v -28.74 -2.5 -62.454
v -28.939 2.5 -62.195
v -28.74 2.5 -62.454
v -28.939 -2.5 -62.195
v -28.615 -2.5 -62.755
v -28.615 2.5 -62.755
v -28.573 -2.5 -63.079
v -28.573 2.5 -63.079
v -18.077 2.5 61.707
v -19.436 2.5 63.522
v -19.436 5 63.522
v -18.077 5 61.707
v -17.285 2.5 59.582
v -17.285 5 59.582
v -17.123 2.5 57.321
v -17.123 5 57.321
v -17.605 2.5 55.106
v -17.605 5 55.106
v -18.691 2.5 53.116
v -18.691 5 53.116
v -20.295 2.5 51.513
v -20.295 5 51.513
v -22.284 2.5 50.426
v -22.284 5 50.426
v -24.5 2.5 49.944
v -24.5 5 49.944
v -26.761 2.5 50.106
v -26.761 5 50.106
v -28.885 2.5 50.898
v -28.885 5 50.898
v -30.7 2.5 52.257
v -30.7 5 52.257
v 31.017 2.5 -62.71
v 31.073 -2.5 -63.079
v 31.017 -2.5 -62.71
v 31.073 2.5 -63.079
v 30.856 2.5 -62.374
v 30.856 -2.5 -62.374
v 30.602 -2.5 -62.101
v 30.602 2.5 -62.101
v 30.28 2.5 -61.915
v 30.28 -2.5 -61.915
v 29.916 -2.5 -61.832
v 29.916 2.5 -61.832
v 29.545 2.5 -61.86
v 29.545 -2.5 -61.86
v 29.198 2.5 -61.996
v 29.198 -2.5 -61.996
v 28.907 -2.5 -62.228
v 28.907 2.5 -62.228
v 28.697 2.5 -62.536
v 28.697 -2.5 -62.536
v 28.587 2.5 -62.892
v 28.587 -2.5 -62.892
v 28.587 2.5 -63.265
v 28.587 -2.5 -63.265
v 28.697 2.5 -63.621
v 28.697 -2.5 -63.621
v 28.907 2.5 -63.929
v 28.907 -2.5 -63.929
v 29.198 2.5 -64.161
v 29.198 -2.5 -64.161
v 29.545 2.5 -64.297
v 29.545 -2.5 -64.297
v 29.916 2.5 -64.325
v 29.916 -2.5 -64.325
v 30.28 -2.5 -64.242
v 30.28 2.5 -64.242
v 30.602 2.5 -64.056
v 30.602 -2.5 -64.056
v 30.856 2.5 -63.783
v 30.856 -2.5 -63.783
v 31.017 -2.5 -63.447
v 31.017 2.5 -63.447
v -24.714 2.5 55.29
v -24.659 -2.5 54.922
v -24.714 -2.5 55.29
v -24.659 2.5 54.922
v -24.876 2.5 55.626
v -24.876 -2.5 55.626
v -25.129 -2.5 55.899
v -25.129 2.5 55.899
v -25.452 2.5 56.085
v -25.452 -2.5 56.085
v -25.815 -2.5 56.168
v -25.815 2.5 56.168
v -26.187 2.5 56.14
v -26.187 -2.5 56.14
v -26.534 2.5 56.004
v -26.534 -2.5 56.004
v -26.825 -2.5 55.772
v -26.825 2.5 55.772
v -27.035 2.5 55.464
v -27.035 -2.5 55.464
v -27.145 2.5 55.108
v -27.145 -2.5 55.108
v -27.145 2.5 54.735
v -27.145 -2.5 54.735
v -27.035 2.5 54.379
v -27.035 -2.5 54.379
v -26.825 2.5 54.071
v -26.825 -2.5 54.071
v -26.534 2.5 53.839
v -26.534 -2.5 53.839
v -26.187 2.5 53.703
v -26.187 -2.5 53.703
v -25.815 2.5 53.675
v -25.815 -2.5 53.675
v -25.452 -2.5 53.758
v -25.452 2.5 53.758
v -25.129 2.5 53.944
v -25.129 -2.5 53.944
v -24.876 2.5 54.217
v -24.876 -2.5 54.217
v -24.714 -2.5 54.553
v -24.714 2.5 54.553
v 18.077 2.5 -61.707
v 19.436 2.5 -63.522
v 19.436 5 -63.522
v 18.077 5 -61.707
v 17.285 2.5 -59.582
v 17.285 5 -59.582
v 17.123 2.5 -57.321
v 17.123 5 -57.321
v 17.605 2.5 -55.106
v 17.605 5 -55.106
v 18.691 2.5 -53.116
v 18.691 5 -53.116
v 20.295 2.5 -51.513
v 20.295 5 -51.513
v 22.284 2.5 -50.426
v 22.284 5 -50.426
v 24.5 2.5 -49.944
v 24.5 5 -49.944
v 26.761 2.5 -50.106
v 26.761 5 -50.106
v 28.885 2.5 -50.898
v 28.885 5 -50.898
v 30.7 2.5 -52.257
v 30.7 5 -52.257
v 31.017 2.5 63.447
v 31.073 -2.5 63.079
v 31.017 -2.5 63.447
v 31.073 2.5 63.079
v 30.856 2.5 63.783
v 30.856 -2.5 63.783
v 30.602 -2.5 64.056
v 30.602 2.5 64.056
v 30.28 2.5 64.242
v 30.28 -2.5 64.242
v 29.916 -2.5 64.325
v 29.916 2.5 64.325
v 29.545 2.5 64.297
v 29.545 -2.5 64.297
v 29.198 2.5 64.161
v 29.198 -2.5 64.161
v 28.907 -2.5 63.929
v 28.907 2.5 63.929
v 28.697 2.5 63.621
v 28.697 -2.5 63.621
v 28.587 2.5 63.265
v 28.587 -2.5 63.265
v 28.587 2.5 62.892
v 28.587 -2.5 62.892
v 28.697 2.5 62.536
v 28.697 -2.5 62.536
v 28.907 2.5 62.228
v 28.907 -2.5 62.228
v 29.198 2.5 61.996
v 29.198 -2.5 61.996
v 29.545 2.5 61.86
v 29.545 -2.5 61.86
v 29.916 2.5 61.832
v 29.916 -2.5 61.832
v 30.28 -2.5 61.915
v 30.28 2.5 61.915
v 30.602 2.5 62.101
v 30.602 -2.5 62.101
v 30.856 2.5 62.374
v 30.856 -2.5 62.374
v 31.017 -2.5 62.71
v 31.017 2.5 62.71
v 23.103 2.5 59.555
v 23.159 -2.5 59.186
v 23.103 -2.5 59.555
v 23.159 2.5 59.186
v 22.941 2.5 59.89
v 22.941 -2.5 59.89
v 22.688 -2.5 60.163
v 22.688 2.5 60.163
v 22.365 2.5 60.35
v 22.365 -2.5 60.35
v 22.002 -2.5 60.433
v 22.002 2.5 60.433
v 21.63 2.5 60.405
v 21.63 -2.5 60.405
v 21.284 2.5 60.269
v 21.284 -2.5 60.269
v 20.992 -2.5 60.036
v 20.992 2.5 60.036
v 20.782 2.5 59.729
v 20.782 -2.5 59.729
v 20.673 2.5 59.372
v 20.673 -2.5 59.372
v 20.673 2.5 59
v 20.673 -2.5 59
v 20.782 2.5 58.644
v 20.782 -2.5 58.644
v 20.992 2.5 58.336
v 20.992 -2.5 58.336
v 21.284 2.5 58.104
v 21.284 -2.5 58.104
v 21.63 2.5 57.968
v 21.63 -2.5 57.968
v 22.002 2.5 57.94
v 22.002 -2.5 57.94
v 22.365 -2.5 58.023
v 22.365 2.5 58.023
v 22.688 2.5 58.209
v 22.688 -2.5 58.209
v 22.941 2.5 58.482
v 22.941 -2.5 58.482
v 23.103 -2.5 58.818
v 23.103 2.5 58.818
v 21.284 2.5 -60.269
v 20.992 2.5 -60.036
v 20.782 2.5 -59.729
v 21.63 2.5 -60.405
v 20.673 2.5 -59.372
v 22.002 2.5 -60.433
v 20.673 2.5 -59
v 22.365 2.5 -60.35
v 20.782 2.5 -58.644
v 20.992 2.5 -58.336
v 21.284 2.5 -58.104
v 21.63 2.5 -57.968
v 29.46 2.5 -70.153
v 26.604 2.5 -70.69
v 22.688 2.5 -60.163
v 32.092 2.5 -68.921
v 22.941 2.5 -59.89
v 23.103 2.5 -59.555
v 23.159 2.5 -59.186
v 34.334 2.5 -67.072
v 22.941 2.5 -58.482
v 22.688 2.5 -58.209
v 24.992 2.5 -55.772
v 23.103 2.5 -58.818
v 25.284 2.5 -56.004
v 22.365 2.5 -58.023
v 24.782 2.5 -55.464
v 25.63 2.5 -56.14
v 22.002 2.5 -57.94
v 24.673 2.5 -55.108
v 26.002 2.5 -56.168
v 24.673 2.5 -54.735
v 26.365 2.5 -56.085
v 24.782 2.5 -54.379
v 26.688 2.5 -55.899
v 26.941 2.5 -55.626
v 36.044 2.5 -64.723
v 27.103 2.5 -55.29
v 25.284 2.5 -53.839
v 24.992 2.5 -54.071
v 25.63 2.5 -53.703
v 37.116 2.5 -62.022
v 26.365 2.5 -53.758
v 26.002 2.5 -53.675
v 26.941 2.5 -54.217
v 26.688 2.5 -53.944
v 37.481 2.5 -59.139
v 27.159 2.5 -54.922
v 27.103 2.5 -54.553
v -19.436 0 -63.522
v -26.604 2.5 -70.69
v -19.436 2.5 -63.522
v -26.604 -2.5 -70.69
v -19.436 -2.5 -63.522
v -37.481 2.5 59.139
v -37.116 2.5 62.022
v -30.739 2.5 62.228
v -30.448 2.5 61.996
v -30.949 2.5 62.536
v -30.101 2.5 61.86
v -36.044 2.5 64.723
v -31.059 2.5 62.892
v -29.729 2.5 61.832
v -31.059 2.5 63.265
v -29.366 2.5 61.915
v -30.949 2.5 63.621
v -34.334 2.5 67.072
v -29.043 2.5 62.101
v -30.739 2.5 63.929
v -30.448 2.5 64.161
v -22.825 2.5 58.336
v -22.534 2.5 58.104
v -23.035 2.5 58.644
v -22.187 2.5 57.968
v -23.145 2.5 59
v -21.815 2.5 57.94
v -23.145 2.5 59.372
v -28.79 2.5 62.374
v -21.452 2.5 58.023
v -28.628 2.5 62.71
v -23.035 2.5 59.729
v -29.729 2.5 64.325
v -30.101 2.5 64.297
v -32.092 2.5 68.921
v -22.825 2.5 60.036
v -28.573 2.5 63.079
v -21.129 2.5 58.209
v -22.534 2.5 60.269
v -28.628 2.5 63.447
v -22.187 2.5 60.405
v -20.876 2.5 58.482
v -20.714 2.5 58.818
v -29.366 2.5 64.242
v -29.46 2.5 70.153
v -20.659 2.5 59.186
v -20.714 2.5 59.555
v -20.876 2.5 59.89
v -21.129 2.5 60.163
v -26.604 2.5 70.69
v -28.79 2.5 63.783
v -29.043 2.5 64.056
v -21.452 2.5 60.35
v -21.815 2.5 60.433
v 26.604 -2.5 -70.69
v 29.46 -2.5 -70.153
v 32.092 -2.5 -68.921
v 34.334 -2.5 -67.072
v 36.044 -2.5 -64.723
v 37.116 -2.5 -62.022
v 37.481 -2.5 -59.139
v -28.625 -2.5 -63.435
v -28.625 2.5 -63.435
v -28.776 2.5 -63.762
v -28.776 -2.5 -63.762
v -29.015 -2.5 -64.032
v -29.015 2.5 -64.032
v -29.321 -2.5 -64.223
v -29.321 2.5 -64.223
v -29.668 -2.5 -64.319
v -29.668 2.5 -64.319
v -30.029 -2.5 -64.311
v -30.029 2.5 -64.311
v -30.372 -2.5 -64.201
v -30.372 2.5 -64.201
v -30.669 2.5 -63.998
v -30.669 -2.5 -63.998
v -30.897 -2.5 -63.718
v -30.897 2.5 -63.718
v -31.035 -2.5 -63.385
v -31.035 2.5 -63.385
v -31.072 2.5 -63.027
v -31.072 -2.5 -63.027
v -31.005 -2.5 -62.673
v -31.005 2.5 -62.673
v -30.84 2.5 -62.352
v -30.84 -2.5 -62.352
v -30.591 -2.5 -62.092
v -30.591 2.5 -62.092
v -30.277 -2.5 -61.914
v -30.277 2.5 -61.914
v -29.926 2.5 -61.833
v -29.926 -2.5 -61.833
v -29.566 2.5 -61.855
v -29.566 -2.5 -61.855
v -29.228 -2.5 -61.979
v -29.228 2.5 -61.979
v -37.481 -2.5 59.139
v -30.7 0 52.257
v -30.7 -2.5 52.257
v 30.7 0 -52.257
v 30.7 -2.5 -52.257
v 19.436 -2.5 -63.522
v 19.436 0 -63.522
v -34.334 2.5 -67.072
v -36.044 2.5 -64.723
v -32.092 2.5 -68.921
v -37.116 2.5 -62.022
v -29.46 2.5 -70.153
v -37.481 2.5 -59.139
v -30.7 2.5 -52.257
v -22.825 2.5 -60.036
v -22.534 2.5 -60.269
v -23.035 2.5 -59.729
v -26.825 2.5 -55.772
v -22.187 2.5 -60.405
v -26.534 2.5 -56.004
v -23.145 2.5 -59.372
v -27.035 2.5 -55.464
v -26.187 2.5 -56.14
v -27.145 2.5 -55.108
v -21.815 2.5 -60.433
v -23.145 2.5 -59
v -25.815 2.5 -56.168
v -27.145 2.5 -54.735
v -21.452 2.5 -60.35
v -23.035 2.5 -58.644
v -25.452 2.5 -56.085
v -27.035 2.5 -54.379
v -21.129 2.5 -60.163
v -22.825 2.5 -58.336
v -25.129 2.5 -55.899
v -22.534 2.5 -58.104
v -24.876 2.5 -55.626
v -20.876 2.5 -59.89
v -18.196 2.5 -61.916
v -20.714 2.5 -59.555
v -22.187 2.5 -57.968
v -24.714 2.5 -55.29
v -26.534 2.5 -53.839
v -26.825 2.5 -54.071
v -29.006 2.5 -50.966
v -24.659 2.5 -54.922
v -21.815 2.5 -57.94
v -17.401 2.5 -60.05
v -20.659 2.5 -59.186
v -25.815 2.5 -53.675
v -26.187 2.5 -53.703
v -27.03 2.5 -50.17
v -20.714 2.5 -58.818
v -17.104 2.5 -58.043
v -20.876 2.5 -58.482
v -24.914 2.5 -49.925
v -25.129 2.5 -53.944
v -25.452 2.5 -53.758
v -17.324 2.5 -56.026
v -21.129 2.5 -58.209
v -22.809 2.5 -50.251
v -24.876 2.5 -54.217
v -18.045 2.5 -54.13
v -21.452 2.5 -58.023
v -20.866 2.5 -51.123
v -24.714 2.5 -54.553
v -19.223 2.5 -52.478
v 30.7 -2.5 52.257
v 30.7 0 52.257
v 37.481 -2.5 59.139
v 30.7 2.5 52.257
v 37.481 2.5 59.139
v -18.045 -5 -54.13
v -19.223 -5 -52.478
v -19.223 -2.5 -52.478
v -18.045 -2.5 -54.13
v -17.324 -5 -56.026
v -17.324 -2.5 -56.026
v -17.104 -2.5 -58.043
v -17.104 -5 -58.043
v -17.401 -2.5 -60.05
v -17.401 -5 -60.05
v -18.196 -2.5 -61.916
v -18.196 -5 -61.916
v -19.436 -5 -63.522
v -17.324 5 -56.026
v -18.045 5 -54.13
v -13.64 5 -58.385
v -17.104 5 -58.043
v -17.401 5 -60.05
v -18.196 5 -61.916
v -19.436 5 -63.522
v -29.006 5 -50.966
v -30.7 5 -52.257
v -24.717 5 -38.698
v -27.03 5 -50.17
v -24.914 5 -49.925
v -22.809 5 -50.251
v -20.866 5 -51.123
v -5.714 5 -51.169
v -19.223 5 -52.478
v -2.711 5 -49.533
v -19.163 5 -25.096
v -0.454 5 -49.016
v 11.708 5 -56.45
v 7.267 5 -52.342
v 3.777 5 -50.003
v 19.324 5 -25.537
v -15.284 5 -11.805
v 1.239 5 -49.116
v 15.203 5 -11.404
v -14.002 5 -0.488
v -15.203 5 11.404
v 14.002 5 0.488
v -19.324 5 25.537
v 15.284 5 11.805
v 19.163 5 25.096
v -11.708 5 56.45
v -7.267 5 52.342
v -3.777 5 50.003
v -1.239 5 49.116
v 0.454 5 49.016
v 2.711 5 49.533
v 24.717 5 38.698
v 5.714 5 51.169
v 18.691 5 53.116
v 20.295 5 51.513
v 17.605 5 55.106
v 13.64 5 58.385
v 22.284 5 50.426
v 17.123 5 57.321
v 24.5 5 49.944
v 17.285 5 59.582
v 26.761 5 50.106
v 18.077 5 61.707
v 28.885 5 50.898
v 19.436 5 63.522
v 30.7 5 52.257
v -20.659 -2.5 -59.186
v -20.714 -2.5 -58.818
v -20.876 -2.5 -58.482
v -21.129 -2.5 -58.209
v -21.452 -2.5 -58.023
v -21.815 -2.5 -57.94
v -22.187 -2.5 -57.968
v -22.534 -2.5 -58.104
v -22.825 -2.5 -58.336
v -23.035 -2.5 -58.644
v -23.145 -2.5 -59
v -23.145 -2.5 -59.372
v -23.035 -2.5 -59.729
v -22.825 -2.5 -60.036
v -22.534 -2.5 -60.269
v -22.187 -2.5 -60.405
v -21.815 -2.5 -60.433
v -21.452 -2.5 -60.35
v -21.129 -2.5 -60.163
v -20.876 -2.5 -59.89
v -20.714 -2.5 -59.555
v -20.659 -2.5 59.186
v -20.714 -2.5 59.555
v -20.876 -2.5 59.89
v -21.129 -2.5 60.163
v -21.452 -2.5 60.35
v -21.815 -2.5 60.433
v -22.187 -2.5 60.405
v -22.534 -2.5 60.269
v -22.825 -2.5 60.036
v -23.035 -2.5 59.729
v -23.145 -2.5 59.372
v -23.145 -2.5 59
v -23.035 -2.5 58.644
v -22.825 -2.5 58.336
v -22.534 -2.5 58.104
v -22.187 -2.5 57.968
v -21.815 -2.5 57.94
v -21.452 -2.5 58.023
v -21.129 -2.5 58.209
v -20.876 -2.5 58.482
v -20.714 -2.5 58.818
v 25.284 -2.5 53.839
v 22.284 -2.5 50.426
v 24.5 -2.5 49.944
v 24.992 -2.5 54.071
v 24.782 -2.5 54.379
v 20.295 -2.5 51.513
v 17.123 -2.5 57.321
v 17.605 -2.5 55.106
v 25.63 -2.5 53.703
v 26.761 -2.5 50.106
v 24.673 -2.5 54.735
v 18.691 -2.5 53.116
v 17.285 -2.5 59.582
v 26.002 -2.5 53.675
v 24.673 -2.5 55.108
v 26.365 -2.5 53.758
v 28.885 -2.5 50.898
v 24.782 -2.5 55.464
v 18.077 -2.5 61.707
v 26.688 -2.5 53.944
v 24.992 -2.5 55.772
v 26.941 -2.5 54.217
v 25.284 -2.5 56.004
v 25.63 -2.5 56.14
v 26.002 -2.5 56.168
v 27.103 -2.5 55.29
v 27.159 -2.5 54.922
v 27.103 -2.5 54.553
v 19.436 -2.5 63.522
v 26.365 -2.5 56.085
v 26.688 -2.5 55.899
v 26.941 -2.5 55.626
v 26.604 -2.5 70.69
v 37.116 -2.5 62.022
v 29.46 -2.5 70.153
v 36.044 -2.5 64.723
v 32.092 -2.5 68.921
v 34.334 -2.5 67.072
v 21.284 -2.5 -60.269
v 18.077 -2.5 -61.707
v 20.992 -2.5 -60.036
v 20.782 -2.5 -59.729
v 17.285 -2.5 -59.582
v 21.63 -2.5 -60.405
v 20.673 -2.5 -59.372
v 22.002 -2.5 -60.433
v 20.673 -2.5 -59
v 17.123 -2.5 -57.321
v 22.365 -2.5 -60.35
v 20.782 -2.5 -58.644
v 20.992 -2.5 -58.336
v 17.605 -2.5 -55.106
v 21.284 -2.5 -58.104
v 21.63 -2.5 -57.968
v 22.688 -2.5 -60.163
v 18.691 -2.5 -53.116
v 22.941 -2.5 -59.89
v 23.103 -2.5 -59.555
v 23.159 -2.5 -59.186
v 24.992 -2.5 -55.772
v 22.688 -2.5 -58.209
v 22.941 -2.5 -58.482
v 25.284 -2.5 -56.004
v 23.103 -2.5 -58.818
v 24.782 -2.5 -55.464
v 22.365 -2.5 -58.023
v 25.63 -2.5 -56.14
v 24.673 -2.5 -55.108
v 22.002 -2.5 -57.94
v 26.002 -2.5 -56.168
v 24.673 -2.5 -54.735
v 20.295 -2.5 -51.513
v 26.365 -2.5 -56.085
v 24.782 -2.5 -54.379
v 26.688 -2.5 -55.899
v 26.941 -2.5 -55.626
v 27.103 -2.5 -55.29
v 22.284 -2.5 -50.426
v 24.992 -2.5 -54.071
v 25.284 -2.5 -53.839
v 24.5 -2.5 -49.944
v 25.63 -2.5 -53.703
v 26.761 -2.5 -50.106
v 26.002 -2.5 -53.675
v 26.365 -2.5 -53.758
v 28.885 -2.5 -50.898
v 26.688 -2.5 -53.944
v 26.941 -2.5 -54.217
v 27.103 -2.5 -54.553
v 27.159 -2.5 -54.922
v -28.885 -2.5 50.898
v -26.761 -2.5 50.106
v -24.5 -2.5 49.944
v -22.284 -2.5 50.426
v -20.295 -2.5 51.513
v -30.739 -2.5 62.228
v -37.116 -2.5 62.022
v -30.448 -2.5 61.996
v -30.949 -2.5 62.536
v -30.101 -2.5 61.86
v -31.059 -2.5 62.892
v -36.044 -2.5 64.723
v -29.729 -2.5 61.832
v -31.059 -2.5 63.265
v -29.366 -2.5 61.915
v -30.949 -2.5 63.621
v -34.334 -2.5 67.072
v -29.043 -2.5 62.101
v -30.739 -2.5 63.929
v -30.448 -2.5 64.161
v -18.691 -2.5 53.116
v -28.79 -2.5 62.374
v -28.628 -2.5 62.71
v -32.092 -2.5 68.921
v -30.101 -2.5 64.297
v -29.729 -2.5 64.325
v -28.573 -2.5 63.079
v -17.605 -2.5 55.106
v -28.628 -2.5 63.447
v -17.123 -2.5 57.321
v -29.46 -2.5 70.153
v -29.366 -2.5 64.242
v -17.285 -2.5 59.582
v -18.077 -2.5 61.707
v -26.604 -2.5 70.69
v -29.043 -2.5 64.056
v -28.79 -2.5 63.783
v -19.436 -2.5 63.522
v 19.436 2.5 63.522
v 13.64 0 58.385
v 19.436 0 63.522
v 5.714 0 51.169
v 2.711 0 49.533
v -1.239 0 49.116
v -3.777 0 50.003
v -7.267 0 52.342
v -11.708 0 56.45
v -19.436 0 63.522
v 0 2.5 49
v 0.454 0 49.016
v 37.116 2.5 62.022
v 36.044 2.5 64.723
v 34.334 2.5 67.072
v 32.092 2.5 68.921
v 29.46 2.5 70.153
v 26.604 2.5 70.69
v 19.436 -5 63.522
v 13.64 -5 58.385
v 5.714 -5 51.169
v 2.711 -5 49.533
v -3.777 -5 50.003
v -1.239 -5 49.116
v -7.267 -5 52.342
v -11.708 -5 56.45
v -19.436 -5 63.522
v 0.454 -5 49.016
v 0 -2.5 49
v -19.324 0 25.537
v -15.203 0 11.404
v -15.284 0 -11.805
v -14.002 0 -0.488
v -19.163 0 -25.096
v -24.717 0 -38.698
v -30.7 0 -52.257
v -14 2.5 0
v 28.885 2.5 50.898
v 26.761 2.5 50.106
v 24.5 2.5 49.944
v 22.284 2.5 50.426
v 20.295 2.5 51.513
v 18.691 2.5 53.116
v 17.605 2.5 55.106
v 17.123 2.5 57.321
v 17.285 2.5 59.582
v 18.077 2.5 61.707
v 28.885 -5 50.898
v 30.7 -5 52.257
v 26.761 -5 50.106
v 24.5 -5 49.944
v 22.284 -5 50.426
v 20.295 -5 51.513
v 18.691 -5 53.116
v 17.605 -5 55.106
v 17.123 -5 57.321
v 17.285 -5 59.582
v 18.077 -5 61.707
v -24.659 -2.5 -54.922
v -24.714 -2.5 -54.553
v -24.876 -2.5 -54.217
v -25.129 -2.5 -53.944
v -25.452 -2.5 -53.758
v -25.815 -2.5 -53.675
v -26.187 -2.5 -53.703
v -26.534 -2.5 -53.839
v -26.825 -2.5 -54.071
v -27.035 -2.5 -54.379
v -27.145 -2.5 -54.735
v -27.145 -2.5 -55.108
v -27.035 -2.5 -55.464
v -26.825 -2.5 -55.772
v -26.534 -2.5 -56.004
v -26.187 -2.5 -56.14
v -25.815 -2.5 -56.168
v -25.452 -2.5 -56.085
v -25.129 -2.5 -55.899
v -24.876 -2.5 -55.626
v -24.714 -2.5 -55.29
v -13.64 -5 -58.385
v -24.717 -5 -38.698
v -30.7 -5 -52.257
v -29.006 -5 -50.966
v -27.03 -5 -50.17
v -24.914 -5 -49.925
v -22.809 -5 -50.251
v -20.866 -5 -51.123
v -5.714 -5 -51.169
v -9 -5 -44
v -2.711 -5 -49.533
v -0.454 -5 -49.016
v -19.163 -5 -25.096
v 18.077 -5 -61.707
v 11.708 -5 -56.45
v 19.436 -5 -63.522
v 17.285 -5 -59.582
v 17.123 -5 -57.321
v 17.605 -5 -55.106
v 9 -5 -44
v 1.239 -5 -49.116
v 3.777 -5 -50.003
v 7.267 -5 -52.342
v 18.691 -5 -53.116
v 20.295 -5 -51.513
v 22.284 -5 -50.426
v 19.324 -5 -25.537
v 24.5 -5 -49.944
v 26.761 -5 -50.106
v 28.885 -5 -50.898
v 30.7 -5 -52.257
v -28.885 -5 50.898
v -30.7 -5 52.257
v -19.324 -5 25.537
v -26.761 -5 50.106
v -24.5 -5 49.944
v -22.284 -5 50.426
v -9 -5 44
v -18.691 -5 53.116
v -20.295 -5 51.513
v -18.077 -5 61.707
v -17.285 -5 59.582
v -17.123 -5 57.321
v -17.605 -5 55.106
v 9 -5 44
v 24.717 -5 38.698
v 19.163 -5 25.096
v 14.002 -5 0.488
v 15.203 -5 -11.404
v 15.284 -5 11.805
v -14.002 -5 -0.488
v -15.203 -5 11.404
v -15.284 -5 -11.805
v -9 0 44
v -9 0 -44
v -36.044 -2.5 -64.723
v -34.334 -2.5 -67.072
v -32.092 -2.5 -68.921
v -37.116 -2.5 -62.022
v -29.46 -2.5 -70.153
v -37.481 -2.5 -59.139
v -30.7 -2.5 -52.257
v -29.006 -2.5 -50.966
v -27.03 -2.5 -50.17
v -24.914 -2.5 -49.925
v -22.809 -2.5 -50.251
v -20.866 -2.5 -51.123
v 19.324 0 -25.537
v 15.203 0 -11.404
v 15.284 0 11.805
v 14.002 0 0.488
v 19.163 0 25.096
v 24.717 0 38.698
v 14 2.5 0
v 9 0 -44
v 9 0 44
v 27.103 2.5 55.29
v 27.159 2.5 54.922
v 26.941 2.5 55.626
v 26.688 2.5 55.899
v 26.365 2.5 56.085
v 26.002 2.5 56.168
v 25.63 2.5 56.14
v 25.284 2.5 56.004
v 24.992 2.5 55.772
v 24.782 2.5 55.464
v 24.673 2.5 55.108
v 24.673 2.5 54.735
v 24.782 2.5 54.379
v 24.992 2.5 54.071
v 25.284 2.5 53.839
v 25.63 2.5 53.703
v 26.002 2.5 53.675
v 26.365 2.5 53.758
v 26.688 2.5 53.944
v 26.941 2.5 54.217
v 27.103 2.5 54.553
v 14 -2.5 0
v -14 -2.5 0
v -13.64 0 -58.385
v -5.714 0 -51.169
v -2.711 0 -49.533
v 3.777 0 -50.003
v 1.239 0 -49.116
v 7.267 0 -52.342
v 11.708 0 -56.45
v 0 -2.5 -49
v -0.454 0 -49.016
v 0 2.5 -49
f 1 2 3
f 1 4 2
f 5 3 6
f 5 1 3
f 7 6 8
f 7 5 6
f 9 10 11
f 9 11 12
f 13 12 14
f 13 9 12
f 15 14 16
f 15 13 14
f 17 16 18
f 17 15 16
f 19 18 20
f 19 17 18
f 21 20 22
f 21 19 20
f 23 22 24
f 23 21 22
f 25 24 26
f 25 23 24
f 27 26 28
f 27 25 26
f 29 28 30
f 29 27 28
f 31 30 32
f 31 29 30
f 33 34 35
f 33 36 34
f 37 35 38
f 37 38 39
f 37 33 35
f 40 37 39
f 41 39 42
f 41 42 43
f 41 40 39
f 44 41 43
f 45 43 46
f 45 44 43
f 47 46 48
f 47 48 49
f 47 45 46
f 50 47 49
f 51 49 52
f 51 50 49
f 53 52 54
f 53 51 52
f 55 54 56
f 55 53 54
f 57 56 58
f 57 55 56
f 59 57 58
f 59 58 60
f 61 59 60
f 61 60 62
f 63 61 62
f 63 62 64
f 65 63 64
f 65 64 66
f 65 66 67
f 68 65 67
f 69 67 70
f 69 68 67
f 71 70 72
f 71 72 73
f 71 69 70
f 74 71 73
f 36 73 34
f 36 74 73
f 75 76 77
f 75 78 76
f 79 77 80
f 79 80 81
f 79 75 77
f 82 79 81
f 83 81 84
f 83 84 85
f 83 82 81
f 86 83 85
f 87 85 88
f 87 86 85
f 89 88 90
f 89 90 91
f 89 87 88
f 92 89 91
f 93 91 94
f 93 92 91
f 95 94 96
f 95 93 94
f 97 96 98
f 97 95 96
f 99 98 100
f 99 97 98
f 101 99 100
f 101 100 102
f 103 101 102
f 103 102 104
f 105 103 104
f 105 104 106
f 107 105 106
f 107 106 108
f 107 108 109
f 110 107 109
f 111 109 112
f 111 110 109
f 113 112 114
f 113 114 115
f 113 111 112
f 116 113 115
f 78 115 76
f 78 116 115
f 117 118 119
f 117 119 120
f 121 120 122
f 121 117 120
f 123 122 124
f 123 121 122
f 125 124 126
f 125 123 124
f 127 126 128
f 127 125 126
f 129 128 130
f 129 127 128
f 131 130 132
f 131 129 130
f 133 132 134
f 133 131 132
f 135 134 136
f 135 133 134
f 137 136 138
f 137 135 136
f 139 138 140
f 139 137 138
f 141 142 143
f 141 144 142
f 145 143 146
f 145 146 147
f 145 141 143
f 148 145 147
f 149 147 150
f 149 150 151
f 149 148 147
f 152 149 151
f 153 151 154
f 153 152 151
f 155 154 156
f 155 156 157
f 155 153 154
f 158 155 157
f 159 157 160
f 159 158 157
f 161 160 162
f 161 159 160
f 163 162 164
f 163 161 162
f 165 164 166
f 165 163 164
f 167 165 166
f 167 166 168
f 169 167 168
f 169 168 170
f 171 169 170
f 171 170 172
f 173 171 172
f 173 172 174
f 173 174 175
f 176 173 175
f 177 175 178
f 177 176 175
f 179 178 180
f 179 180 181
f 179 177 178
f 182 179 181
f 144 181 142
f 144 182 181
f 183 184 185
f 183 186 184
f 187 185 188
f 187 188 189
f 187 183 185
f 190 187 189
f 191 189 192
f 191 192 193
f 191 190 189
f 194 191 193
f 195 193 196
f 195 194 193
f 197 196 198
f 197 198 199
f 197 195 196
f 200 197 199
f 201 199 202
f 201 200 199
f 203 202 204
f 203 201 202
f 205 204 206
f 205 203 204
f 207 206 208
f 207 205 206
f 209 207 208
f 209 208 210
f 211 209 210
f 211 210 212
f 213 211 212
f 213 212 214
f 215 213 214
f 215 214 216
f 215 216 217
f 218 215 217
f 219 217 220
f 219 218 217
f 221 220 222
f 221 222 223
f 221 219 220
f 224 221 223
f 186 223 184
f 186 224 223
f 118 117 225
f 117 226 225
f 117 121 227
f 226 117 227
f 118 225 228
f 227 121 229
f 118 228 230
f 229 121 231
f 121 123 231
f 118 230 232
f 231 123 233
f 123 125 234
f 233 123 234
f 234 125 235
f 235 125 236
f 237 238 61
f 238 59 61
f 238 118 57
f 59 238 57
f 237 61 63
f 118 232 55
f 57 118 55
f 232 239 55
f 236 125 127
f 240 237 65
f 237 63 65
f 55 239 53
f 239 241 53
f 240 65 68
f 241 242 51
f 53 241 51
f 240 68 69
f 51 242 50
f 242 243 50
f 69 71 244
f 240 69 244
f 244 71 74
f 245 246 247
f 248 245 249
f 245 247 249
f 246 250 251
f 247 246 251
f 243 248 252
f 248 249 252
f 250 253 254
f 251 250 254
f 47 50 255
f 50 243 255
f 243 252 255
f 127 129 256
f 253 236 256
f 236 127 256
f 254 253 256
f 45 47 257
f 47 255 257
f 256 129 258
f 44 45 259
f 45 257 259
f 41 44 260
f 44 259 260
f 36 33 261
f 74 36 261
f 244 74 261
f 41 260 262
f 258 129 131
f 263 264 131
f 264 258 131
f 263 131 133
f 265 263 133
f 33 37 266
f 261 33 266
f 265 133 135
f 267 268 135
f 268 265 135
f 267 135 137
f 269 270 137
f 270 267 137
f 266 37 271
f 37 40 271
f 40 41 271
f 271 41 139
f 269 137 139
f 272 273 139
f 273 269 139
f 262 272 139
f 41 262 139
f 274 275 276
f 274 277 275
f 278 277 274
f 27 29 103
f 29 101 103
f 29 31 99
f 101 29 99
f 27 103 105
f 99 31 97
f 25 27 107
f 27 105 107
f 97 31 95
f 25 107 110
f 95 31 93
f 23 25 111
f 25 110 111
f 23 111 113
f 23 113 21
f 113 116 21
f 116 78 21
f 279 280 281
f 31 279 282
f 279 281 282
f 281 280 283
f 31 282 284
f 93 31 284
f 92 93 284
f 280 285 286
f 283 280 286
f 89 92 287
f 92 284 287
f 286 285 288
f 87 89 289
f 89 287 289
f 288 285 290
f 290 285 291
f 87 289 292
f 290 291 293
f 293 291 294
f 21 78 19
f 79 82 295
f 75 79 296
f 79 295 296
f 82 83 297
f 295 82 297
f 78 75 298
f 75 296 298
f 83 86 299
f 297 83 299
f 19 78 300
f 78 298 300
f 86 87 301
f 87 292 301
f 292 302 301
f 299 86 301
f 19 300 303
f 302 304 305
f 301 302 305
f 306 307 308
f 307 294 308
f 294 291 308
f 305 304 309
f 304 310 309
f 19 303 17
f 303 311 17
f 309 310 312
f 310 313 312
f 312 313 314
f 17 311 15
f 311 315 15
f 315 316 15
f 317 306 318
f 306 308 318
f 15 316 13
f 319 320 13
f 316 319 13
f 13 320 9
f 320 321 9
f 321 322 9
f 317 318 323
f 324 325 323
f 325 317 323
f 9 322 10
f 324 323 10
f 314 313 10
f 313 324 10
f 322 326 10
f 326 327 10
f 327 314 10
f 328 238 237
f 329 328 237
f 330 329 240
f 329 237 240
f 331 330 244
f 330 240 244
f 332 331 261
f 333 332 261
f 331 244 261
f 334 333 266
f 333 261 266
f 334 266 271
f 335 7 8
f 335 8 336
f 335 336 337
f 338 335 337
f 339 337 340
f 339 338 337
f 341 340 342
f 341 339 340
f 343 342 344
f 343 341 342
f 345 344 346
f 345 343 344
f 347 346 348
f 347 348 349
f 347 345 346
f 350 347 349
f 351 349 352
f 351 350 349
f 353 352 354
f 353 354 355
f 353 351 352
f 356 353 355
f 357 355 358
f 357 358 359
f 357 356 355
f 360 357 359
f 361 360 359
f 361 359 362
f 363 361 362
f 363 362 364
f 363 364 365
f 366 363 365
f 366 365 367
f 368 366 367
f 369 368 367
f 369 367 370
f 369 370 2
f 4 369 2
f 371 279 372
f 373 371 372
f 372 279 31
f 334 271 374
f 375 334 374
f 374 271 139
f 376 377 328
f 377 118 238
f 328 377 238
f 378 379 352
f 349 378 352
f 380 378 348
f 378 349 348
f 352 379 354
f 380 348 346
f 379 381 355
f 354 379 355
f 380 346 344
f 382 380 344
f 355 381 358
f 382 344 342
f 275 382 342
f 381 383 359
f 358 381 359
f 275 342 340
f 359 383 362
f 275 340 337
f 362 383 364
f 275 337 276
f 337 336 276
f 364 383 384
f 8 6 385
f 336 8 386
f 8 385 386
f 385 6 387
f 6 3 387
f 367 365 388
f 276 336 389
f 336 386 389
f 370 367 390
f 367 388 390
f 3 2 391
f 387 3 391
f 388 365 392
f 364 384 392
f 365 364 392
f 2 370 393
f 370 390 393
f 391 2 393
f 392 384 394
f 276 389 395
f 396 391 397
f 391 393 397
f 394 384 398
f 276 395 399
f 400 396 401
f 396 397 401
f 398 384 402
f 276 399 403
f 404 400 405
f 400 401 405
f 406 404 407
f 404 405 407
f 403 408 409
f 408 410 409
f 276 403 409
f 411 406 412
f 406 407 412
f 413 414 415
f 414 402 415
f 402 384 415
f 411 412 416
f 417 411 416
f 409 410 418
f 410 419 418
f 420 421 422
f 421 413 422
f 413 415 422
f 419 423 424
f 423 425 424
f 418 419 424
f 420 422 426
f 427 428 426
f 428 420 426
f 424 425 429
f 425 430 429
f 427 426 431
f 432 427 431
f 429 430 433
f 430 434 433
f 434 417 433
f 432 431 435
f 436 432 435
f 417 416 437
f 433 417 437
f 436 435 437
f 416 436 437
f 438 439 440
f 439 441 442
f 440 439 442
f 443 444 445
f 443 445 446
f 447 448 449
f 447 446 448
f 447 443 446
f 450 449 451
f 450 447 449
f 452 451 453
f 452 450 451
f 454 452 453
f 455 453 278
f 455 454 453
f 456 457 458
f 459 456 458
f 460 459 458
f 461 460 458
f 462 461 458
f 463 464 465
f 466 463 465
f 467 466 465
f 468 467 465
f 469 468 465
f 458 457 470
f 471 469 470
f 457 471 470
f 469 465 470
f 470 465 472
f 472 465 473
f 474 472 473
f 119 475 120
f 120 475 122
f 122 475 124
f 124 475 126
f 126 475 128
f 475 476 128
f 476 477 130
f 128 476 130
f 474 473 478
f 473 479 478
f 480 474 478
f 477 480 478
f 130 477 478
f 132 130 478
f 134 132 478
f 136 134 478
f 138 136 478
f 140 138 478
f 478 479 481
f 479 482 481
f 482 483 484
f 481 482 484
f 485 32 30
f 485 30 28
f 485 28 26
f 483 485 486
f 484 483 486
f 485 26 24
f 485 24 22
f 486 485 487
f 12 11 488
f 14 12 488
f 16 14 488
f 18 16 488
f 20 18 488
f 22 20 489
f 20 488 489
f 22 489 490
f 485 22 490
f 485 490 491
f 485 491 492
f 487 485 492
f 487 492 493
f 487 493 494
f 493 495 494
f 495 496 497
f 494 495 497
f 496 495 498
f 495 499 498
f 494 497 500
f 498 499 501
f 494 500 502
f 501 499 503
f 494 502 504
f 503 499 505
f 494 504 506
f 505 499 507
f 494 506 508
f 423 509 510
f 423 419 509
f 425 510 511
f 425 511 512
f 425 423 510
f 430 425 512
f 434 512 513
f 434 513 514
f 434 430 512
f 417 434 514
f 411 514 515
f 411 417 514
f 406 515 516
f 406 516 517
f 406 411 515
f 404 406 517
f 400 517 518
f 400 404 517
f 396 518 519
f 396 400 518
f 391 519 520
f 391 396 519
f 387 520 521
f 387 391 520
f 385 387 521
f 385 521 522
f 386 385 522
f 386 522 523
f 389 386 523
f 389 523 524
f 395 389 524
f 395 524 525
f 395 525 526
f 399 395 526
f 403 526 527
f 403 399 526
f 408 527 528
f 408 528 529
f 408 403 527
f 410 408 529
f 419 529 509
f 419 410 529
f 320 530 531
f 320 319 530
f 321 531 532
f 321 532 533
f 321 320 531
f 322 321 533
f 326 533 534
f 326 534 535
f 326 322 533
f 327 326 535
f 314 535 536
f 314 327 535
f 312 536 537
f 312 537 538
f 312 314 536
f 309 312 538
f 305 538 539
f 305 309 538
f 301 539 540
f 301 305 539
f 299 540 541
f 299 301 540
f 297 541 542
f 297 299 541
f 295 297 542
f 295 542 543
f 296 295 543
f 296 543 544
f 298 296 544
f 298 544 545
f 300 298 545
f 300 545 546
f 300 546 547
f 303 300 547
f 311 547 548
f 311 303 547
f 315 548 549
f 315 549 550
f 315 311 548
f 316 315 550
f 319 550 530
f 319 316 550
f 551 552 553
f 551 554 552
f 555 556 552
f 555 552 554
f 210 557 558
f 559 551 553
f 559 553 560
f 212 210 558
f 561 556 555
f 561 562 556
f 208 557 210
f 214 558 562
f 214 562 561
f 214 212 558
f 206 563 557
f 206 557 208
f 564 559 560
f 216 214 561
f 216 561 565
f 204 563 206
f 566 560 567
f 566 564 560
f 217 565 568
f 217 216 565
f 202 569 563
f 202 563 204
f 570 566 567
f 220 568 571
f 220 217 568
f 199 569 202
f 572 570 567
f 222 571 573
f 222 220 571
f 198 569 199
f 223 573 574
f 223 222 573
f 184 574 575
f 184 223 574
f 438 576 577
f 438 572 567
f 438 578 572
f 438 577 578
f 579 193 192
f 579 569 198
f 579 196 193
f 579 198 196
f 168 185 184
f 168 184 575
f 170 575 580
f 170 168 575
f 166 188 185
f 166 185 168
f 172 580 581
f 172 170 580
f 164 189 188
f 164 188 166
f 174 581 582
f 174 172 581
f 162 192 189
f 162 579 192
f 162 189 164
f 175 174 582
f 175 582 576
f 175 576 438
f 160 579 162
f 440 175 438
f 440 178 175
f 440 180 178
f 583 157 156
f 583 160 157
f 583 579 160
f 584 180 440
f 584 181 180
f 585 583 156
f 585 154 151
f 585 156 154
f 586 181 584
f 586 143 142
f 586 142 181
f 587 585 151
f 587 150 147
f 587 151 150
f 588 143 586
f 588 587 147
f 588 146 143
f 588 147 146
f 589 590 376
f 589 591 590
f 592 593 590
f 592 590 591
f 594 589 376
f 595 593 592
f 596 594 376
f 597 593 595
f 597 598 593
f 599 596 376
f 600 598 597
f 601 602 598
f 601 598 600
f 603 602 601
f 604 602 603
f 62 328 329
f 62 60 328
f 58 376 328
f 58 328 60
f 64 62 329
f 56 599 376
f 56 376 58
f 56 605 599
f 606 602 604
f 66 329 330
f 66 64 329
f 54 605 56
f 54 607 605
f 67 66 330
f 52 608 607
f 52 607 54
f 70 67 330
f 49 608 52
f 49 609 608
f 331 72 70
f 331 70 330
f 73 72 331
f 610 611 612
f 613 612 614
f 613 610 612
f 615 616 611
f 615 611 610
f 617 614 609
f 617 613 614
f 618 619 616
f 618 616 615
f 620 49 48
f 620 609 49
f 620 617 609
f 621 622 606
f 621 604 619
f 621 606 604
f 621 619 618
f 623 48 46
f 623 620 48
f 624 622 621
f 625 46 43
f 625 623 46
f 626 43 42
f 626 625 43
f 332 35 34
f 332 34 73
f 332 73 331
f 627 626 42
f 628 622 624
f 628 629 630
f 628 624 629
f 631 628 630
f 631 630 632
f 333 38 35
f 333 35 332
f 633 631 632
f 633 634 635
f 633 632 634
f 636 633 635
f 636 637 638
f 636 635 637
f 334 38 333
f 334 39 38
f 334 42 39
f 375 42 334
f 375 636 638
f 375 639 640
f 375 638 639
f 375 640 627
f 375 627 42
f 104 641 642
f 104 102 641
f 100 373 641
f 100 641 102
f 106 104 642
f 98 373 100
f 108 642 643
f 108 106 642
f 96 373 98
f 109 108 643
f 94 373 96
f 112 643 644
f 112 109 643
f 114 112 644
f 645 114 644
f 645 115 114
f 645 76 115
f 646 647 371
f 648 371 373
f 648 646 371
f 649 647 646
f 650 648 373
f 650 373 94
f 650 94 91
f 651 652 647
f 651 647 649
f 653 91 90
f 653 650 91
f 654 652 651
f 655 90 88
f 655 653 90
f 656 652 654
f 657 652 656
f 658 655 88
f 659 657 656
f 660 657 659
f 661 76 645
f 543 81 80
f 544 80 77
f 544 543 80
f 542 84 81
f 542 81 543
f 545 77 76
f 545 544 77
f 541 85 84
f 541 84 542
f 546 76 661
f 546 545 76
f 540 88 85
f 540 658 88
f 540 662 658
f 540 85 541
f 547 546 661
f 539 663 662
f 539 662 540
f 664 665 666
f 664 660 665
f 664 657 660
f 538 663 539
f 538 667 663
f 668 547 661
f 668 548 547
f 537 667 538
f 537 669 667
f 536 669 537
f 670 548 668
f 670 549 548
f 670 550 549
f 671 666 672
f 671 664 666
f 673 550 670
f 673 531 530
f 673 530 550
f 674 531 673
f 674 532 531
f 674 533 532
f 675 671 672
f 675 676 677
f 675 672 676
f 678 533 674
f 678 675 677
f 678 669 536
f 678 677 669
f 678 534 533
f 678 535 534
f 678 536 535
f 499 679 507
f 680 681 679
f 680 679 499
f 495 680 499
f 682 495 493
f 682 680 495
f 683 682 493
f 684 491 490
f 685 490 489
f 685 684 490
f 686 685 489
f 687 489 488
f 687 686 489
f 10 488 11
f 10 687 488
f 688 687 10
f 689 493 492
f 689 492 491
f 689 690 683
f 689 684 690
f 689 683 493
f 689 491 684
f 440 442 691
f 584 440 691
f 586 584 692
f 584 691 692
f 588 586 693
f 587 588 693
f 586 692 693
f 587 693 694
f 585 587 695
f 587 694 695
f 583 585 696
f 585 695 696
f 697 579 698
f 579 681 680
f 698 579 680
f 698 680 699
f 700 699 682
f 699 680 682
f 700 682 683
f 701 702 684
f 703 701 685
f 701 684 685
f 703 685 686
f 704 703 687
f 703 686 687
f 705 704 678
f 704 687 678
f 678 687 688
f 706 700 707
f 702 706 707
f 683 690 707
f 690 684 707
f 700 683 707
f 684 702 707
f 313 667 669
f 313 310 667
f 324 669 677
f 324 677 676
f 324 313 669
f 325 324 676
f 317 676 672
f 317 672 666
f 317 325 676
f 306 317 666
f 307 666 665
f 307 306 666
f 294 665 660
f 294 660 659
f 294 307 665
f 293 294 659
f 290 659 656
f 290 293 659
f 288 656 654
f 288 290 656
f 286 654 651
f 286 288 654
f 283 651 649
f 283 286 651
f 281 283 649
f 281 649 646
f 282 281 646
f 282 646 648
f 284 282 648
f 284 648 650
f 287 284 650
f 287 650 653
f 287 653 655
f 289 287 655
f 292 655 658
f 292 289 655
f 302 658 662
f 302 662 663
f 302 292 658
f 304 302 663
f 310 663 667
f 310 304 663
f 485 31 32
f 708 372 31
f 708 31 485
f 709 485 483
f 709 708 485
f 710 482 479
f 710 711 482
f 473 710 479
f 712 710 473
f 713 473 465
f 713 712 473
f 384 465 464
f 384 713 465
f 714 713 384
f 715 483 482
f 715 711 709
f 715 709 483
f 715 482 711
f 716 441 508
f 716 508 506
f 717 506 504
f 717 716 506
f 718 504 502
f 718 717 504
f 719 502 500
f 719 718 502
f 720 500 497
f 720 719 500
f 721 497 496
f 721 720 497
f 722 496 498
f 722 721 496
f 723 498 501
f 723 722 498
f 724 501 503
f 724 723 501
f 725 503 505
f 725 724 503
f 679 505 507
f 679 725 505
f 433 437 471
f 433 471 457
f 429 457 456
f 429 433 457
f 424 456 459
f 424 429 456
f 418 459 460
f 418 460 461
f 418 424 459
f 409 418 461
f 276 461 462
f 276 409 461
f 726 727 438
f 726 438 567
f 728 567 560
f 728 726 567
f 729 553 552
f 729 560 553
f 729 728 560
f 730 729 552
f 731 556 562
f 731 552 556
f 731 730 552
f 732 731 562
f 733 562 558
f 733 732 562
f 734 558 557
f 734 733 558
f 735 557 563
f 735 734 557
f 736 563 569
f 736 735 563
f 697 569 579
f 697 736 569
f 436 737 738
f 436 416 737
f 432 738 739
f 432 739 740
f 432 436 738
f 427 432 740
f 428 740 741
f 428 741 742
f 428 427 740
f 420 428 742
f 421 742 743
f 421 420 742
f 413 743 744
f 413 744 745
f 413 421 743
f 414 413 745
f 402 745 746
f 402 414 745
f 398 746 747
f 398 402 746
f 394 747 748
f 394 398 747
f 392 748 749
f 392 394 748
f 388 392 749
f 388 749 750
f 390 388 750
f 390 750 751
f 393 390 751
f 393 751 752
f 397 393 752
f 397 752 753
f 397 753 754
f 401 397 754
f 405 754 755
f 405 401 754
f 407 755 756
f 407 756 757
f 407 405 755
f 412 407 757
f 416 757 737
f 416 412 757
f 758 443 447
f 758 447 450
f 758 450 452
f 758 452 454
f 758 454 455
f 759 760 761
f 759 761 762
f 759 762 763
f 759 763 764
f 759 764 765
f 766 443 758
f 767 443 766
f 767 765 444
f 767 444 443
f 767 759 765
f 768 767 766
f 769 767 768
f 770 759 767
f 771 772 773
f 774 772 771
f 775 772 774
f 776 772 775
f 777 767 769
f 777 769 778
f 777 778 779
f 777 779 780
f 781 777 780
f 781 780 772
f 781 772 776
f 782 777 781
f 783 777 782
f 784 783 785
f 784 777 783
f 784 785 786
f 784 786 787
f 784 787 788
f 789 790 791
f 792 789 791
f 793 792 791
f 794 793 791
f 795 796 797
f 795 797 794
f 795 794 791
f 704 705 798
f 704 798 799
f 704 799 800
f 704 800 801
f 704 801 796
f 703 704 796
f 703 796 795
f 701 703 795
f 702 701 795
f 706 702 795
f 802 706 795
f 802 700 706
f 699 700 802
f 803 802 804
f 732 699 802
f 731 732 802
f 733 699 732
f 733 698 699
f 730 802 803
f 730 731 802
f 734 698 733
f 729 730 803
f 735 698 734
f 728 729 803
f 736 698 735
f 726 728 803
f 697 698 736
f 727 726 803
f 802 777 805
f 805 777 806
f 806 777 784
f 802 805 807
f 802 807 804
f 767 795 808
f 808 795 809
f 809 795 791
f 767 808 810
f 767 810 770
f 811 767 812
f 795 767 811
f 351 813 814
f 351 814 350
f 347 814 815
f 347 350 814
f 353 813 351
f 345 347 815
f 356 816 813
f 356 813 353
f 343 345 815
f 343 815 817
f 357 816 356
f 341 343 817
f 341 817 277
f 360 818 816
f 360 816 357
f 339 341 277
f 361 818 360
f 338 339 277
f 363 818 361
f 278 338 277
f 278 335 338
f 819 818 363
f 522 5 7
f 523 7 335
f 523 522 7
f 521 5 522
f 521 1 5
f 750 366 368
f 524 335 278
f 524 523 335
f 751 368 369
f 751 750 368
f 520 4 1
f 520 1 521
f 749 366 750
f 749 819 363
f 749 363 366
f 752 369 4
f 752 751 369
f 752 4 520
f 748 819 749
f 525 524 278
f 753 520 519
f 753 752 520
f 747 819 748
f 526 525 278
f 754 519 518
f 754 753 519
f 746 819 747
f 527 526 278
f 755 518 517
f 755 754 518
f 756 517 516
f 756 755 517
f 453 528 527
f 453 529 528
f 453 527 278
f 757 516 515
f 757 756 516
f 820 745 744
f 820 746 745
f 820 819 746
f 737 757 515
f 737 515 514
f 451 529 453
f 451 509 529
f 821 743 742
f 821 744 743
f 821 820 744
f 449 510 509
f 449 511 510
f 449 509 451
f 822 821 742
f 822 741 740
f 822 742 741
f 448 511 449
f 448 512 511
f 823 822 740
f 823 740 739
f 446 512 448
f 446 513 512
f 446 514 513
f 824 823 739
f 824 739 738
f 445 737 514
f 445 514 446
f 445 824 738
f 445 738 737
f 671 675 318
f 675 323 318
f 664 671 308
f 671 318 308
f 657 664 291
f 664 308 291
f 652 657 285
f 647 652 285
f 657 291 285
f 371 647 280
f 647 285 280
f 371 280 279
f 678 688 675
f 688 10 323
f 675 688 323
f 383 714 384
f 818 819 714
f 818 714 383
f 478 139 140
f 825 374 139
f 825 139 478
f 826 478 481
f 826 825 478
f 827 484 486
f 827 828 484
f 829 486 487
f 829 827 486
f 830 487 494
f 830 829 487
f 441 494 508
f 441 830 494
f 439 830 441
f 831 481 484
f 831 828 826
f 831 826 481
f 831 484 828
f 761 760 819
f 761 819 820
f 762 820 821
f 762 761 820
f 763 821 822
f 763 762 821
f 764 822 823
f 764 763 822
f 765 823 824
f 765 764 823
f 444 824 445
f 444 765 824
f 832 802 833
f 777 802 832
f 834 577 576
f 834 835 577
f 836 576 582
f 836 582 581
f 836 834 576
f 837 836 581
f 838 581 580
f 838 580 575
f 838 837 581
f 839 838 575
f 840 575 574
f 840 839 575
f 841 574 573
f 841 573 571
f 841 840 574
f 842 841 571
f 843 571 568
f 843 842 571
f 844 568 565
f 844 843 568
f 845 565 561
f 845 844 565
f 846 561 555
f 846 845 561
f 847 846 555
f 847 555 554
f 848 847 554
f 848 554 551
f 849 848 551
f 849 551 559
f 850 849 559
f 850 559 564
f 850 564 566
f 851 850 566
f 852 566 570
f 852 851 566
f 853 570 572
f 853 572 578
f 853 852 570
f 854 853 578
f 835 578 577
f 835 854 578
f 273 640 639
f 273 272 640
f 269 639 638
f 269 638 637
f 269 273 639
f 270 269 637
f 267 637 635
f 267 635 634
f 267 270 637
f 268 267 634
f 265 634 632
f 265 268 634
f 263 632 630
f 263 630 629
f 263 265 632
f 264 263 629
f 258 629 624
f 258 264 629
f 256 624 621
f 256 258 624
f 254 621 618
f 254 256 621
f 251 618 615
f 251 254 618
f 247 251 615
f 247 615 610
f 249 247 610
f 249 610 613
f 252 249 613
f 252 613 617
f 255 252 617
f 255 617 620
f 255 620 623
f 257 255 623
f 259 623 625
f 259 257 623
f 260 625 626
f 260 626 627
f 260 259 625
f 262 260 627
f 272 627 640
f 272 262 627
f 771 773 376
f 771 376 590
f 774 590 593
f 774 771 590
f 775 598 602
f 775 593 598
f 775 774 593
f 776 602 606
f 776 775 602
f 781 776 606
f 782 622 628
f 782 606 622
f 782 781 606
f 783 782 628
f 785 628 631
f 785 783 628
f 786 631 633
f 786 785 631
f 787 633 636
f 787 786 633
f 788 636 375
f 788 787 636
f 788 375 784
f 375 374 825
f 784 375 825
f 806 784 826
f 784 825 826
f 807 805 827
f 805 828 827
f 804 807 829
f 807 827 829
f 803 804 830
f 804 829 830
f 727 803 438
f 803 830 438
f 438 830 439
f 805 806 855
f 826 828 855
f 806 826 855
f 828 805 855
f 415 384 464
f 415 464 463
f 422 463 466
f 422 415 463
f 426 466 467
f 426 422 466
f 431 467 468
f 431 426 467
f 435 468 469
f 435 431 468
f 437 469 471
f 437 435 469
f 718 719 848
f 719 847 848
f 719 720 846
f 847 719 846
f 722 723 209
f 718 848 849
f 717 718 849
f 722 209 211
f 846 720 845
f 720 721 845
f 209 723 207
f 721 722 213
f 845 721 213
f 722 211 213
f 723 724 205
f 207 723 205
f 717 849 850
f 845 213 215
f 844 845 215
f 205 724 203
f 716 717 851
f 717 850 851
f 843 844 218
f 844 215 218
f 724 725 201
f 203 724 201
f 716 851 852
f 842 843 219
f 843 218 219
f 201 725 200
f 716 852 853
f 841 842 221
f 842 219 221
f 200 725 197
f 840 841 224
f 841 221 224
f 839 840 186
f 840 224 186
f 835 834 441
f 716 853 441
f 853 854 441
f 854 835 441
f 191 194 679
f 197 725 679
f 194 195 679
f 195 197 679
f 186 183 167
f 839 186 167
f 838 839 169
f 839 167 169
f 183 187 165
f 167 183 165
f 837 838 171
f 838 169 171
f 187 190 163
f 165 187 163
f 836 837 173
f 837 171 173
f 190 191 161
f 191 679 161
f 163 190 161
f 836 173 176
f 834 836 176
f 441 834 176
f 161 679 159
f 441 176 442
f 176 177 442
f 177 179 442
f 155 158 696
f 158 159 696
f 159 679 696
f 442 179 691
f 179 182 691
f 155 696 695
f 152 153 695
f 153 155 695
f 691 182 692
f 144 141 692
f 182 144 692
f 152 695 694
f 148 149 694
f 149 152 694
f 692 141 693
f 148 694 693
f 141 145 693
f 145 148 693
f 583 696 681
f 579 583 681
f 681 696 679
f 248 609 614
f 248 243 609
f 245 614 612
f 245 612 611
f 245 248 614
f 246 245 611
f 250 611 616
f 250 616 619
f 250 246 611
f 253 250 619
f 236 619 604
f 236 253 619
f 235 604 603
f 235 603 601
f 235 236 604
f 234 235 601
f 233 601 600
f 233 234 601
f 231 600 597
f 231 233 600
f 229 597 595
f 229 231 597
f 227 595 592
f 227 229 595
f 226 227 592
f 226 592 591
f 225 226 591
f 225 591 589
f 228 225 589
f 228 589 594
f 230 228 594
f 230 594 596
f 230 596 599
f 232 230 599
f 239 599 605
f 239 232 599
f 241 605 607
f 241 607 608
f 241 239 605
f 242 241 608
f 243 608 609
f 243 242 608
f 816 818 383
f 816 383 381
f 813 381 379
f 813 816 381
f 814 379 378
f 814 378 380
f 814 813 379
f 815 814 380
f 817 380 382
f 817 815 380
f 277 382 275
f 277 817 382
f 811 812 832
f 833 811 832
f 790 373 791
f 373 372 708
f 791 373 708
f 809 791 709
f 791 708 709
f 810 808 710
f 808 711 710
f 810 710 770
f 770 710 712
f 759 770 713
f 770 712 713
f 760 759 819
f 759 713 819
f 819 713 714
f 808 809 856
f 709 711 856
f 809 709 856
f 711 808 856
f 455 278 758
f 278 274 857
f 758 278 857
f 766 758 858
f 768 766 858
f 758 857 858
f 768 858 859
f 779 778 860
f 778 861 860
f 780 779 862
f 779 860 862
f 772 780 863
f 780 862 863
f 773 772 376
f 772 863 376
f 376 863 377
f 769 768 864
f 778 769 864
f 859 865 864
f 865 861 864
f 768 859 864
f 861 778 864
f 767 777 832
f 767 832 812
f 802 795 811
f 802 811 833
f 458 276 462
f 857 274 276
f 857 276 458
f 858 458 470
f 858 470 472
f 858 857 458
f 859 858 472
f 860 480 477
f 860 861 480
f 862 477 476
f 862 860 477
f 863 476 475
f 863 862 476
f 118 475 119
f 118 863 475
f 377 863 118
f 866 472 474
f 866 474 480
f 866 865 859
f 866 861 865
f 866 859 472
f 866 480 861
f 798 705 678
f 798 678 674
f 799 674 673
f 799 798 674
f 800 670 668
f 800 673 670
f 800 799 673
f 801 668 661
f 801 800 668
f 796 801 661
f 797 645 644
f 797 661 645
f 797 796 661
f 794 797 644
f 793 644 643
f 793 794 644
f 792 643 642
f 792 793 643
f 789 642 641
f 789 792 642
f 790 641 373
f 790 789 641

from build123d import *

# Parameters (mm, degrees)
F1_DEPTH = 5
F2_DEPTH = 5
F0_R     = 1.25
F3_DEPTH = 2.5


with BuildPart() as f1:
    # F0 (on Front) → F1 (new body, symmetric)
    with BuildSketch(Plane.XZ):
        with BuildLine():
            Line((-9, 0), (-9, 44))
            Line((-9, 44), (0, 44))
            Line((0, 44), (0, 49))
            add(Edge.make_bspline(
                [(-19.43566, 63.521571), (-13.189036, 59.186175), (-6.594518, 49), (0, 49)],
                knots=[0, 0, 0, 0, 24.261511, 24.261511, 24.261511, 24.261511], degree=3))
            ThreePointArc((-19.43566, 63.521571), (-19.43566, 52.256946), (-30.700285, 52.256946))
            add(Edge.make_bspline(
                [(-14, 0), (-14, 17.46672), (-23.267117, 34.933441), (-30.700285, 52.256946)],
                knots=[54.860623, 54.860623, 54.860623, 54.860623, 109.721246, 109.721246, 109.721246, 109.721246], degree=3))
            Line((-14, 0), (-9, 0))
        make_face()
        with BuildLine():
            Line((0, 49), (0, 44))
            Line((0, 44), (9, 44))
            Line((9, 44), (9, -44))
            Line((9, -44), (-9, -44))
            Line((-9, -44), (-9, 0))
            Line((-9, 0), (-14, 0))
            add(Edge.make_bspline(
                [(-30.700285, -52.256946), (-23.267117, -34.933441), (-14, -17.46672), (-14, 0)],
                knots=[0, 0, 0, 0, 54.860623, 54.860623, 54.860623, 54.860623], degree=3))
            ThreePointArc((-30.700285, -52.256946), (-24.914376, -49.925447), (-19.222671, -52.478313))
            ThreePointArc((-19.222671, -52.478313), (-17.104161, -58.042855), (-19.43566, -63.521571))
            add(Edge.make_bspline(
                [(-19.43566, -63.521571), (-13.189036, -59.186175), (0, -38.813825), (13.189036, -59.186175), (19.43566, -63.521571)],
                knots=[0, 0, 0, 0, 24.261511, 48.523022, 48.523022, 48.523022, 48.523022], degree=3))
            ThreePointArc((19.43566, -63.521571), (19.43566, -52.256946), (30.700285, -52.256946))
            add(Edge.make_bspline(
                [(30.700285, -52.256946), (23.267117, -34.933441), (4.732883, 0), (23.267117, 34.933441), (30.700285, 52.256946)],
                knots=[0, 0, 0, 0, 54.860623, 109.721246, 109.721246, 109.721246, 109.721246], degree=3))
            ThreePointArc((30.700285, 52.256946), (19.43566, 52.256946), (19.43566, 63.521571))
            add(Edge.make_bspline(
                [(0, 49), (6.594518, 49), (13.189036, 59.186175), (19.43566, 63.521571)],
                knots=[24.261511, 24.261511, 24.261511, 24.261511, 48.523022, 48.523022, 48.523022, 48.523022], degree=3))
        make_face()
    extrude(amount=F1_DEPTH, both=True)

    # F0 (on Front) → F2 (join)
    with BuildSketch(Plane.XZ):
        Polygon((0, 44), (-9, 44), (-9, 0), (-9, -44), (9, -44), (9, 44), align=None)
    extrude(amount=-F2_DEPTH)

    # F0 (on Front) → F3 (join, symmetric)
    with BuildSketch(Plane.XZ):
        with BuildLine():
            ThreePointArc((-30.700285, 52.256946), (-19.43566, 52.256946), (-19.43566, 63.521571))
            Line((-19.43566, 63.521571), (-26.604424, 70.690334))
            ThreePointArc((-26.604424, 70.690334), (-34.333678, 67.072101), (-37.480628, 59.139279))
            Line((-37.480628, 59.139279), (-30.700285, 52.256946))
        make_face()
        with Locations((-29.82286, 63.078503)):
            Circle(F0_R, mode=Mode.SUBTRACT)
        with Locations((-25.908636, 54.921638)):
            Circle(F0_R, mode=Mode.SUBTRACT)
        with Locations((-21.908602, 59.186175)):
            Circle(F0_R, mode=Mode.SUBTRACT)
        with BuildLine():
            Line((26.604424, 70.690334), (19.43566, 63.521571))
            ThreePointArc((19.43566, 63.521571), (19.43566, 52.256946), (30.700285, 52.256946))
            Line((30.700285, 52.256946), (37.480628, 59.139279))
            ThreePointArc((37.480628, 59.139279), (34.333678, 67.072101), (26.604424, 70.690334))
        make_face()
        with Locations((21.908602, 59.186175)):
            Circle(F0_R, mode=Mode.SUBTRACT)
        with Locations((25.908636, 54.921638)):
            Circle(F0_R, mode=Mode.SUBTRACT)
        with Locations((29.82286, 63.078503)):
            Circle(F0_R, mode=Mode.SUBTRACT)
        with BuildLine():
            Line((37.480628, -59.139279), (30.700285, -52.256946))
            ThreePointArc((30.700285, -52.256946), (19.43566, -52.256946), (19.43566, -63.521571))
            Line((19.43566, -63.521571), (26.604424, -70.690334))
            ThreePointArc((26.604424, -70.690334), (34.333678, -67.072101), (37.480628, -59.139279))
        make_face()
        with Locations((21.908602, -59.186175)):
            Circle(F0_R, mode=Mode.SUBTRACT)
        with Locations((25.908636, -54.921638)):
            Circle(F0_R, mode=Mode.SUBTRACT)
        with Locations((29.82286, -63.078503)):
            Circle(F0_R, mode=Mode.SUBTRACT)
        with BuildLine():
            ThreePointArc((-19.222671, -52.478313), (-24.914376, -49.925447), (-30.700285, -52.256946))
            Line((-30.700285, -52.256946), (-37.480628, -59.139279))
            ThreePointArc((-37.480628, -59.139279), (-34.333678, -67.072101), (-26.604424, -70.690334))
            Line((-26.604424, -70.690334), (-19.43566, -63.521571))
            ThreePointArc((-19.43566, -63.521571), (-17.104161, -58.042855), (-19.222671, -52.478313))
        make_face()
        with BuildLine():
            ThreePointArc((-28.57286, -63.078503), (-30.977709, -63.556857), (-28.938977, -62.194619))
            ThreePointArc((-28.938977, -62.194619), (-28.668011, -62.600148), (-28.57286, -63.078503))
        make_face(mode=Mode.SUBTRACT)
        with Locations((-25.908636, -54.921638)):
            Circle(F0_R, mode=Mode.SUBTRACT)
        with Locations((-21.908602, -59.186175)):
            Circle(F0_R, mode=Mode.SUBTRACT)
    extrude(amount=F3_DEPTH, both=True)


solid = f1.part
